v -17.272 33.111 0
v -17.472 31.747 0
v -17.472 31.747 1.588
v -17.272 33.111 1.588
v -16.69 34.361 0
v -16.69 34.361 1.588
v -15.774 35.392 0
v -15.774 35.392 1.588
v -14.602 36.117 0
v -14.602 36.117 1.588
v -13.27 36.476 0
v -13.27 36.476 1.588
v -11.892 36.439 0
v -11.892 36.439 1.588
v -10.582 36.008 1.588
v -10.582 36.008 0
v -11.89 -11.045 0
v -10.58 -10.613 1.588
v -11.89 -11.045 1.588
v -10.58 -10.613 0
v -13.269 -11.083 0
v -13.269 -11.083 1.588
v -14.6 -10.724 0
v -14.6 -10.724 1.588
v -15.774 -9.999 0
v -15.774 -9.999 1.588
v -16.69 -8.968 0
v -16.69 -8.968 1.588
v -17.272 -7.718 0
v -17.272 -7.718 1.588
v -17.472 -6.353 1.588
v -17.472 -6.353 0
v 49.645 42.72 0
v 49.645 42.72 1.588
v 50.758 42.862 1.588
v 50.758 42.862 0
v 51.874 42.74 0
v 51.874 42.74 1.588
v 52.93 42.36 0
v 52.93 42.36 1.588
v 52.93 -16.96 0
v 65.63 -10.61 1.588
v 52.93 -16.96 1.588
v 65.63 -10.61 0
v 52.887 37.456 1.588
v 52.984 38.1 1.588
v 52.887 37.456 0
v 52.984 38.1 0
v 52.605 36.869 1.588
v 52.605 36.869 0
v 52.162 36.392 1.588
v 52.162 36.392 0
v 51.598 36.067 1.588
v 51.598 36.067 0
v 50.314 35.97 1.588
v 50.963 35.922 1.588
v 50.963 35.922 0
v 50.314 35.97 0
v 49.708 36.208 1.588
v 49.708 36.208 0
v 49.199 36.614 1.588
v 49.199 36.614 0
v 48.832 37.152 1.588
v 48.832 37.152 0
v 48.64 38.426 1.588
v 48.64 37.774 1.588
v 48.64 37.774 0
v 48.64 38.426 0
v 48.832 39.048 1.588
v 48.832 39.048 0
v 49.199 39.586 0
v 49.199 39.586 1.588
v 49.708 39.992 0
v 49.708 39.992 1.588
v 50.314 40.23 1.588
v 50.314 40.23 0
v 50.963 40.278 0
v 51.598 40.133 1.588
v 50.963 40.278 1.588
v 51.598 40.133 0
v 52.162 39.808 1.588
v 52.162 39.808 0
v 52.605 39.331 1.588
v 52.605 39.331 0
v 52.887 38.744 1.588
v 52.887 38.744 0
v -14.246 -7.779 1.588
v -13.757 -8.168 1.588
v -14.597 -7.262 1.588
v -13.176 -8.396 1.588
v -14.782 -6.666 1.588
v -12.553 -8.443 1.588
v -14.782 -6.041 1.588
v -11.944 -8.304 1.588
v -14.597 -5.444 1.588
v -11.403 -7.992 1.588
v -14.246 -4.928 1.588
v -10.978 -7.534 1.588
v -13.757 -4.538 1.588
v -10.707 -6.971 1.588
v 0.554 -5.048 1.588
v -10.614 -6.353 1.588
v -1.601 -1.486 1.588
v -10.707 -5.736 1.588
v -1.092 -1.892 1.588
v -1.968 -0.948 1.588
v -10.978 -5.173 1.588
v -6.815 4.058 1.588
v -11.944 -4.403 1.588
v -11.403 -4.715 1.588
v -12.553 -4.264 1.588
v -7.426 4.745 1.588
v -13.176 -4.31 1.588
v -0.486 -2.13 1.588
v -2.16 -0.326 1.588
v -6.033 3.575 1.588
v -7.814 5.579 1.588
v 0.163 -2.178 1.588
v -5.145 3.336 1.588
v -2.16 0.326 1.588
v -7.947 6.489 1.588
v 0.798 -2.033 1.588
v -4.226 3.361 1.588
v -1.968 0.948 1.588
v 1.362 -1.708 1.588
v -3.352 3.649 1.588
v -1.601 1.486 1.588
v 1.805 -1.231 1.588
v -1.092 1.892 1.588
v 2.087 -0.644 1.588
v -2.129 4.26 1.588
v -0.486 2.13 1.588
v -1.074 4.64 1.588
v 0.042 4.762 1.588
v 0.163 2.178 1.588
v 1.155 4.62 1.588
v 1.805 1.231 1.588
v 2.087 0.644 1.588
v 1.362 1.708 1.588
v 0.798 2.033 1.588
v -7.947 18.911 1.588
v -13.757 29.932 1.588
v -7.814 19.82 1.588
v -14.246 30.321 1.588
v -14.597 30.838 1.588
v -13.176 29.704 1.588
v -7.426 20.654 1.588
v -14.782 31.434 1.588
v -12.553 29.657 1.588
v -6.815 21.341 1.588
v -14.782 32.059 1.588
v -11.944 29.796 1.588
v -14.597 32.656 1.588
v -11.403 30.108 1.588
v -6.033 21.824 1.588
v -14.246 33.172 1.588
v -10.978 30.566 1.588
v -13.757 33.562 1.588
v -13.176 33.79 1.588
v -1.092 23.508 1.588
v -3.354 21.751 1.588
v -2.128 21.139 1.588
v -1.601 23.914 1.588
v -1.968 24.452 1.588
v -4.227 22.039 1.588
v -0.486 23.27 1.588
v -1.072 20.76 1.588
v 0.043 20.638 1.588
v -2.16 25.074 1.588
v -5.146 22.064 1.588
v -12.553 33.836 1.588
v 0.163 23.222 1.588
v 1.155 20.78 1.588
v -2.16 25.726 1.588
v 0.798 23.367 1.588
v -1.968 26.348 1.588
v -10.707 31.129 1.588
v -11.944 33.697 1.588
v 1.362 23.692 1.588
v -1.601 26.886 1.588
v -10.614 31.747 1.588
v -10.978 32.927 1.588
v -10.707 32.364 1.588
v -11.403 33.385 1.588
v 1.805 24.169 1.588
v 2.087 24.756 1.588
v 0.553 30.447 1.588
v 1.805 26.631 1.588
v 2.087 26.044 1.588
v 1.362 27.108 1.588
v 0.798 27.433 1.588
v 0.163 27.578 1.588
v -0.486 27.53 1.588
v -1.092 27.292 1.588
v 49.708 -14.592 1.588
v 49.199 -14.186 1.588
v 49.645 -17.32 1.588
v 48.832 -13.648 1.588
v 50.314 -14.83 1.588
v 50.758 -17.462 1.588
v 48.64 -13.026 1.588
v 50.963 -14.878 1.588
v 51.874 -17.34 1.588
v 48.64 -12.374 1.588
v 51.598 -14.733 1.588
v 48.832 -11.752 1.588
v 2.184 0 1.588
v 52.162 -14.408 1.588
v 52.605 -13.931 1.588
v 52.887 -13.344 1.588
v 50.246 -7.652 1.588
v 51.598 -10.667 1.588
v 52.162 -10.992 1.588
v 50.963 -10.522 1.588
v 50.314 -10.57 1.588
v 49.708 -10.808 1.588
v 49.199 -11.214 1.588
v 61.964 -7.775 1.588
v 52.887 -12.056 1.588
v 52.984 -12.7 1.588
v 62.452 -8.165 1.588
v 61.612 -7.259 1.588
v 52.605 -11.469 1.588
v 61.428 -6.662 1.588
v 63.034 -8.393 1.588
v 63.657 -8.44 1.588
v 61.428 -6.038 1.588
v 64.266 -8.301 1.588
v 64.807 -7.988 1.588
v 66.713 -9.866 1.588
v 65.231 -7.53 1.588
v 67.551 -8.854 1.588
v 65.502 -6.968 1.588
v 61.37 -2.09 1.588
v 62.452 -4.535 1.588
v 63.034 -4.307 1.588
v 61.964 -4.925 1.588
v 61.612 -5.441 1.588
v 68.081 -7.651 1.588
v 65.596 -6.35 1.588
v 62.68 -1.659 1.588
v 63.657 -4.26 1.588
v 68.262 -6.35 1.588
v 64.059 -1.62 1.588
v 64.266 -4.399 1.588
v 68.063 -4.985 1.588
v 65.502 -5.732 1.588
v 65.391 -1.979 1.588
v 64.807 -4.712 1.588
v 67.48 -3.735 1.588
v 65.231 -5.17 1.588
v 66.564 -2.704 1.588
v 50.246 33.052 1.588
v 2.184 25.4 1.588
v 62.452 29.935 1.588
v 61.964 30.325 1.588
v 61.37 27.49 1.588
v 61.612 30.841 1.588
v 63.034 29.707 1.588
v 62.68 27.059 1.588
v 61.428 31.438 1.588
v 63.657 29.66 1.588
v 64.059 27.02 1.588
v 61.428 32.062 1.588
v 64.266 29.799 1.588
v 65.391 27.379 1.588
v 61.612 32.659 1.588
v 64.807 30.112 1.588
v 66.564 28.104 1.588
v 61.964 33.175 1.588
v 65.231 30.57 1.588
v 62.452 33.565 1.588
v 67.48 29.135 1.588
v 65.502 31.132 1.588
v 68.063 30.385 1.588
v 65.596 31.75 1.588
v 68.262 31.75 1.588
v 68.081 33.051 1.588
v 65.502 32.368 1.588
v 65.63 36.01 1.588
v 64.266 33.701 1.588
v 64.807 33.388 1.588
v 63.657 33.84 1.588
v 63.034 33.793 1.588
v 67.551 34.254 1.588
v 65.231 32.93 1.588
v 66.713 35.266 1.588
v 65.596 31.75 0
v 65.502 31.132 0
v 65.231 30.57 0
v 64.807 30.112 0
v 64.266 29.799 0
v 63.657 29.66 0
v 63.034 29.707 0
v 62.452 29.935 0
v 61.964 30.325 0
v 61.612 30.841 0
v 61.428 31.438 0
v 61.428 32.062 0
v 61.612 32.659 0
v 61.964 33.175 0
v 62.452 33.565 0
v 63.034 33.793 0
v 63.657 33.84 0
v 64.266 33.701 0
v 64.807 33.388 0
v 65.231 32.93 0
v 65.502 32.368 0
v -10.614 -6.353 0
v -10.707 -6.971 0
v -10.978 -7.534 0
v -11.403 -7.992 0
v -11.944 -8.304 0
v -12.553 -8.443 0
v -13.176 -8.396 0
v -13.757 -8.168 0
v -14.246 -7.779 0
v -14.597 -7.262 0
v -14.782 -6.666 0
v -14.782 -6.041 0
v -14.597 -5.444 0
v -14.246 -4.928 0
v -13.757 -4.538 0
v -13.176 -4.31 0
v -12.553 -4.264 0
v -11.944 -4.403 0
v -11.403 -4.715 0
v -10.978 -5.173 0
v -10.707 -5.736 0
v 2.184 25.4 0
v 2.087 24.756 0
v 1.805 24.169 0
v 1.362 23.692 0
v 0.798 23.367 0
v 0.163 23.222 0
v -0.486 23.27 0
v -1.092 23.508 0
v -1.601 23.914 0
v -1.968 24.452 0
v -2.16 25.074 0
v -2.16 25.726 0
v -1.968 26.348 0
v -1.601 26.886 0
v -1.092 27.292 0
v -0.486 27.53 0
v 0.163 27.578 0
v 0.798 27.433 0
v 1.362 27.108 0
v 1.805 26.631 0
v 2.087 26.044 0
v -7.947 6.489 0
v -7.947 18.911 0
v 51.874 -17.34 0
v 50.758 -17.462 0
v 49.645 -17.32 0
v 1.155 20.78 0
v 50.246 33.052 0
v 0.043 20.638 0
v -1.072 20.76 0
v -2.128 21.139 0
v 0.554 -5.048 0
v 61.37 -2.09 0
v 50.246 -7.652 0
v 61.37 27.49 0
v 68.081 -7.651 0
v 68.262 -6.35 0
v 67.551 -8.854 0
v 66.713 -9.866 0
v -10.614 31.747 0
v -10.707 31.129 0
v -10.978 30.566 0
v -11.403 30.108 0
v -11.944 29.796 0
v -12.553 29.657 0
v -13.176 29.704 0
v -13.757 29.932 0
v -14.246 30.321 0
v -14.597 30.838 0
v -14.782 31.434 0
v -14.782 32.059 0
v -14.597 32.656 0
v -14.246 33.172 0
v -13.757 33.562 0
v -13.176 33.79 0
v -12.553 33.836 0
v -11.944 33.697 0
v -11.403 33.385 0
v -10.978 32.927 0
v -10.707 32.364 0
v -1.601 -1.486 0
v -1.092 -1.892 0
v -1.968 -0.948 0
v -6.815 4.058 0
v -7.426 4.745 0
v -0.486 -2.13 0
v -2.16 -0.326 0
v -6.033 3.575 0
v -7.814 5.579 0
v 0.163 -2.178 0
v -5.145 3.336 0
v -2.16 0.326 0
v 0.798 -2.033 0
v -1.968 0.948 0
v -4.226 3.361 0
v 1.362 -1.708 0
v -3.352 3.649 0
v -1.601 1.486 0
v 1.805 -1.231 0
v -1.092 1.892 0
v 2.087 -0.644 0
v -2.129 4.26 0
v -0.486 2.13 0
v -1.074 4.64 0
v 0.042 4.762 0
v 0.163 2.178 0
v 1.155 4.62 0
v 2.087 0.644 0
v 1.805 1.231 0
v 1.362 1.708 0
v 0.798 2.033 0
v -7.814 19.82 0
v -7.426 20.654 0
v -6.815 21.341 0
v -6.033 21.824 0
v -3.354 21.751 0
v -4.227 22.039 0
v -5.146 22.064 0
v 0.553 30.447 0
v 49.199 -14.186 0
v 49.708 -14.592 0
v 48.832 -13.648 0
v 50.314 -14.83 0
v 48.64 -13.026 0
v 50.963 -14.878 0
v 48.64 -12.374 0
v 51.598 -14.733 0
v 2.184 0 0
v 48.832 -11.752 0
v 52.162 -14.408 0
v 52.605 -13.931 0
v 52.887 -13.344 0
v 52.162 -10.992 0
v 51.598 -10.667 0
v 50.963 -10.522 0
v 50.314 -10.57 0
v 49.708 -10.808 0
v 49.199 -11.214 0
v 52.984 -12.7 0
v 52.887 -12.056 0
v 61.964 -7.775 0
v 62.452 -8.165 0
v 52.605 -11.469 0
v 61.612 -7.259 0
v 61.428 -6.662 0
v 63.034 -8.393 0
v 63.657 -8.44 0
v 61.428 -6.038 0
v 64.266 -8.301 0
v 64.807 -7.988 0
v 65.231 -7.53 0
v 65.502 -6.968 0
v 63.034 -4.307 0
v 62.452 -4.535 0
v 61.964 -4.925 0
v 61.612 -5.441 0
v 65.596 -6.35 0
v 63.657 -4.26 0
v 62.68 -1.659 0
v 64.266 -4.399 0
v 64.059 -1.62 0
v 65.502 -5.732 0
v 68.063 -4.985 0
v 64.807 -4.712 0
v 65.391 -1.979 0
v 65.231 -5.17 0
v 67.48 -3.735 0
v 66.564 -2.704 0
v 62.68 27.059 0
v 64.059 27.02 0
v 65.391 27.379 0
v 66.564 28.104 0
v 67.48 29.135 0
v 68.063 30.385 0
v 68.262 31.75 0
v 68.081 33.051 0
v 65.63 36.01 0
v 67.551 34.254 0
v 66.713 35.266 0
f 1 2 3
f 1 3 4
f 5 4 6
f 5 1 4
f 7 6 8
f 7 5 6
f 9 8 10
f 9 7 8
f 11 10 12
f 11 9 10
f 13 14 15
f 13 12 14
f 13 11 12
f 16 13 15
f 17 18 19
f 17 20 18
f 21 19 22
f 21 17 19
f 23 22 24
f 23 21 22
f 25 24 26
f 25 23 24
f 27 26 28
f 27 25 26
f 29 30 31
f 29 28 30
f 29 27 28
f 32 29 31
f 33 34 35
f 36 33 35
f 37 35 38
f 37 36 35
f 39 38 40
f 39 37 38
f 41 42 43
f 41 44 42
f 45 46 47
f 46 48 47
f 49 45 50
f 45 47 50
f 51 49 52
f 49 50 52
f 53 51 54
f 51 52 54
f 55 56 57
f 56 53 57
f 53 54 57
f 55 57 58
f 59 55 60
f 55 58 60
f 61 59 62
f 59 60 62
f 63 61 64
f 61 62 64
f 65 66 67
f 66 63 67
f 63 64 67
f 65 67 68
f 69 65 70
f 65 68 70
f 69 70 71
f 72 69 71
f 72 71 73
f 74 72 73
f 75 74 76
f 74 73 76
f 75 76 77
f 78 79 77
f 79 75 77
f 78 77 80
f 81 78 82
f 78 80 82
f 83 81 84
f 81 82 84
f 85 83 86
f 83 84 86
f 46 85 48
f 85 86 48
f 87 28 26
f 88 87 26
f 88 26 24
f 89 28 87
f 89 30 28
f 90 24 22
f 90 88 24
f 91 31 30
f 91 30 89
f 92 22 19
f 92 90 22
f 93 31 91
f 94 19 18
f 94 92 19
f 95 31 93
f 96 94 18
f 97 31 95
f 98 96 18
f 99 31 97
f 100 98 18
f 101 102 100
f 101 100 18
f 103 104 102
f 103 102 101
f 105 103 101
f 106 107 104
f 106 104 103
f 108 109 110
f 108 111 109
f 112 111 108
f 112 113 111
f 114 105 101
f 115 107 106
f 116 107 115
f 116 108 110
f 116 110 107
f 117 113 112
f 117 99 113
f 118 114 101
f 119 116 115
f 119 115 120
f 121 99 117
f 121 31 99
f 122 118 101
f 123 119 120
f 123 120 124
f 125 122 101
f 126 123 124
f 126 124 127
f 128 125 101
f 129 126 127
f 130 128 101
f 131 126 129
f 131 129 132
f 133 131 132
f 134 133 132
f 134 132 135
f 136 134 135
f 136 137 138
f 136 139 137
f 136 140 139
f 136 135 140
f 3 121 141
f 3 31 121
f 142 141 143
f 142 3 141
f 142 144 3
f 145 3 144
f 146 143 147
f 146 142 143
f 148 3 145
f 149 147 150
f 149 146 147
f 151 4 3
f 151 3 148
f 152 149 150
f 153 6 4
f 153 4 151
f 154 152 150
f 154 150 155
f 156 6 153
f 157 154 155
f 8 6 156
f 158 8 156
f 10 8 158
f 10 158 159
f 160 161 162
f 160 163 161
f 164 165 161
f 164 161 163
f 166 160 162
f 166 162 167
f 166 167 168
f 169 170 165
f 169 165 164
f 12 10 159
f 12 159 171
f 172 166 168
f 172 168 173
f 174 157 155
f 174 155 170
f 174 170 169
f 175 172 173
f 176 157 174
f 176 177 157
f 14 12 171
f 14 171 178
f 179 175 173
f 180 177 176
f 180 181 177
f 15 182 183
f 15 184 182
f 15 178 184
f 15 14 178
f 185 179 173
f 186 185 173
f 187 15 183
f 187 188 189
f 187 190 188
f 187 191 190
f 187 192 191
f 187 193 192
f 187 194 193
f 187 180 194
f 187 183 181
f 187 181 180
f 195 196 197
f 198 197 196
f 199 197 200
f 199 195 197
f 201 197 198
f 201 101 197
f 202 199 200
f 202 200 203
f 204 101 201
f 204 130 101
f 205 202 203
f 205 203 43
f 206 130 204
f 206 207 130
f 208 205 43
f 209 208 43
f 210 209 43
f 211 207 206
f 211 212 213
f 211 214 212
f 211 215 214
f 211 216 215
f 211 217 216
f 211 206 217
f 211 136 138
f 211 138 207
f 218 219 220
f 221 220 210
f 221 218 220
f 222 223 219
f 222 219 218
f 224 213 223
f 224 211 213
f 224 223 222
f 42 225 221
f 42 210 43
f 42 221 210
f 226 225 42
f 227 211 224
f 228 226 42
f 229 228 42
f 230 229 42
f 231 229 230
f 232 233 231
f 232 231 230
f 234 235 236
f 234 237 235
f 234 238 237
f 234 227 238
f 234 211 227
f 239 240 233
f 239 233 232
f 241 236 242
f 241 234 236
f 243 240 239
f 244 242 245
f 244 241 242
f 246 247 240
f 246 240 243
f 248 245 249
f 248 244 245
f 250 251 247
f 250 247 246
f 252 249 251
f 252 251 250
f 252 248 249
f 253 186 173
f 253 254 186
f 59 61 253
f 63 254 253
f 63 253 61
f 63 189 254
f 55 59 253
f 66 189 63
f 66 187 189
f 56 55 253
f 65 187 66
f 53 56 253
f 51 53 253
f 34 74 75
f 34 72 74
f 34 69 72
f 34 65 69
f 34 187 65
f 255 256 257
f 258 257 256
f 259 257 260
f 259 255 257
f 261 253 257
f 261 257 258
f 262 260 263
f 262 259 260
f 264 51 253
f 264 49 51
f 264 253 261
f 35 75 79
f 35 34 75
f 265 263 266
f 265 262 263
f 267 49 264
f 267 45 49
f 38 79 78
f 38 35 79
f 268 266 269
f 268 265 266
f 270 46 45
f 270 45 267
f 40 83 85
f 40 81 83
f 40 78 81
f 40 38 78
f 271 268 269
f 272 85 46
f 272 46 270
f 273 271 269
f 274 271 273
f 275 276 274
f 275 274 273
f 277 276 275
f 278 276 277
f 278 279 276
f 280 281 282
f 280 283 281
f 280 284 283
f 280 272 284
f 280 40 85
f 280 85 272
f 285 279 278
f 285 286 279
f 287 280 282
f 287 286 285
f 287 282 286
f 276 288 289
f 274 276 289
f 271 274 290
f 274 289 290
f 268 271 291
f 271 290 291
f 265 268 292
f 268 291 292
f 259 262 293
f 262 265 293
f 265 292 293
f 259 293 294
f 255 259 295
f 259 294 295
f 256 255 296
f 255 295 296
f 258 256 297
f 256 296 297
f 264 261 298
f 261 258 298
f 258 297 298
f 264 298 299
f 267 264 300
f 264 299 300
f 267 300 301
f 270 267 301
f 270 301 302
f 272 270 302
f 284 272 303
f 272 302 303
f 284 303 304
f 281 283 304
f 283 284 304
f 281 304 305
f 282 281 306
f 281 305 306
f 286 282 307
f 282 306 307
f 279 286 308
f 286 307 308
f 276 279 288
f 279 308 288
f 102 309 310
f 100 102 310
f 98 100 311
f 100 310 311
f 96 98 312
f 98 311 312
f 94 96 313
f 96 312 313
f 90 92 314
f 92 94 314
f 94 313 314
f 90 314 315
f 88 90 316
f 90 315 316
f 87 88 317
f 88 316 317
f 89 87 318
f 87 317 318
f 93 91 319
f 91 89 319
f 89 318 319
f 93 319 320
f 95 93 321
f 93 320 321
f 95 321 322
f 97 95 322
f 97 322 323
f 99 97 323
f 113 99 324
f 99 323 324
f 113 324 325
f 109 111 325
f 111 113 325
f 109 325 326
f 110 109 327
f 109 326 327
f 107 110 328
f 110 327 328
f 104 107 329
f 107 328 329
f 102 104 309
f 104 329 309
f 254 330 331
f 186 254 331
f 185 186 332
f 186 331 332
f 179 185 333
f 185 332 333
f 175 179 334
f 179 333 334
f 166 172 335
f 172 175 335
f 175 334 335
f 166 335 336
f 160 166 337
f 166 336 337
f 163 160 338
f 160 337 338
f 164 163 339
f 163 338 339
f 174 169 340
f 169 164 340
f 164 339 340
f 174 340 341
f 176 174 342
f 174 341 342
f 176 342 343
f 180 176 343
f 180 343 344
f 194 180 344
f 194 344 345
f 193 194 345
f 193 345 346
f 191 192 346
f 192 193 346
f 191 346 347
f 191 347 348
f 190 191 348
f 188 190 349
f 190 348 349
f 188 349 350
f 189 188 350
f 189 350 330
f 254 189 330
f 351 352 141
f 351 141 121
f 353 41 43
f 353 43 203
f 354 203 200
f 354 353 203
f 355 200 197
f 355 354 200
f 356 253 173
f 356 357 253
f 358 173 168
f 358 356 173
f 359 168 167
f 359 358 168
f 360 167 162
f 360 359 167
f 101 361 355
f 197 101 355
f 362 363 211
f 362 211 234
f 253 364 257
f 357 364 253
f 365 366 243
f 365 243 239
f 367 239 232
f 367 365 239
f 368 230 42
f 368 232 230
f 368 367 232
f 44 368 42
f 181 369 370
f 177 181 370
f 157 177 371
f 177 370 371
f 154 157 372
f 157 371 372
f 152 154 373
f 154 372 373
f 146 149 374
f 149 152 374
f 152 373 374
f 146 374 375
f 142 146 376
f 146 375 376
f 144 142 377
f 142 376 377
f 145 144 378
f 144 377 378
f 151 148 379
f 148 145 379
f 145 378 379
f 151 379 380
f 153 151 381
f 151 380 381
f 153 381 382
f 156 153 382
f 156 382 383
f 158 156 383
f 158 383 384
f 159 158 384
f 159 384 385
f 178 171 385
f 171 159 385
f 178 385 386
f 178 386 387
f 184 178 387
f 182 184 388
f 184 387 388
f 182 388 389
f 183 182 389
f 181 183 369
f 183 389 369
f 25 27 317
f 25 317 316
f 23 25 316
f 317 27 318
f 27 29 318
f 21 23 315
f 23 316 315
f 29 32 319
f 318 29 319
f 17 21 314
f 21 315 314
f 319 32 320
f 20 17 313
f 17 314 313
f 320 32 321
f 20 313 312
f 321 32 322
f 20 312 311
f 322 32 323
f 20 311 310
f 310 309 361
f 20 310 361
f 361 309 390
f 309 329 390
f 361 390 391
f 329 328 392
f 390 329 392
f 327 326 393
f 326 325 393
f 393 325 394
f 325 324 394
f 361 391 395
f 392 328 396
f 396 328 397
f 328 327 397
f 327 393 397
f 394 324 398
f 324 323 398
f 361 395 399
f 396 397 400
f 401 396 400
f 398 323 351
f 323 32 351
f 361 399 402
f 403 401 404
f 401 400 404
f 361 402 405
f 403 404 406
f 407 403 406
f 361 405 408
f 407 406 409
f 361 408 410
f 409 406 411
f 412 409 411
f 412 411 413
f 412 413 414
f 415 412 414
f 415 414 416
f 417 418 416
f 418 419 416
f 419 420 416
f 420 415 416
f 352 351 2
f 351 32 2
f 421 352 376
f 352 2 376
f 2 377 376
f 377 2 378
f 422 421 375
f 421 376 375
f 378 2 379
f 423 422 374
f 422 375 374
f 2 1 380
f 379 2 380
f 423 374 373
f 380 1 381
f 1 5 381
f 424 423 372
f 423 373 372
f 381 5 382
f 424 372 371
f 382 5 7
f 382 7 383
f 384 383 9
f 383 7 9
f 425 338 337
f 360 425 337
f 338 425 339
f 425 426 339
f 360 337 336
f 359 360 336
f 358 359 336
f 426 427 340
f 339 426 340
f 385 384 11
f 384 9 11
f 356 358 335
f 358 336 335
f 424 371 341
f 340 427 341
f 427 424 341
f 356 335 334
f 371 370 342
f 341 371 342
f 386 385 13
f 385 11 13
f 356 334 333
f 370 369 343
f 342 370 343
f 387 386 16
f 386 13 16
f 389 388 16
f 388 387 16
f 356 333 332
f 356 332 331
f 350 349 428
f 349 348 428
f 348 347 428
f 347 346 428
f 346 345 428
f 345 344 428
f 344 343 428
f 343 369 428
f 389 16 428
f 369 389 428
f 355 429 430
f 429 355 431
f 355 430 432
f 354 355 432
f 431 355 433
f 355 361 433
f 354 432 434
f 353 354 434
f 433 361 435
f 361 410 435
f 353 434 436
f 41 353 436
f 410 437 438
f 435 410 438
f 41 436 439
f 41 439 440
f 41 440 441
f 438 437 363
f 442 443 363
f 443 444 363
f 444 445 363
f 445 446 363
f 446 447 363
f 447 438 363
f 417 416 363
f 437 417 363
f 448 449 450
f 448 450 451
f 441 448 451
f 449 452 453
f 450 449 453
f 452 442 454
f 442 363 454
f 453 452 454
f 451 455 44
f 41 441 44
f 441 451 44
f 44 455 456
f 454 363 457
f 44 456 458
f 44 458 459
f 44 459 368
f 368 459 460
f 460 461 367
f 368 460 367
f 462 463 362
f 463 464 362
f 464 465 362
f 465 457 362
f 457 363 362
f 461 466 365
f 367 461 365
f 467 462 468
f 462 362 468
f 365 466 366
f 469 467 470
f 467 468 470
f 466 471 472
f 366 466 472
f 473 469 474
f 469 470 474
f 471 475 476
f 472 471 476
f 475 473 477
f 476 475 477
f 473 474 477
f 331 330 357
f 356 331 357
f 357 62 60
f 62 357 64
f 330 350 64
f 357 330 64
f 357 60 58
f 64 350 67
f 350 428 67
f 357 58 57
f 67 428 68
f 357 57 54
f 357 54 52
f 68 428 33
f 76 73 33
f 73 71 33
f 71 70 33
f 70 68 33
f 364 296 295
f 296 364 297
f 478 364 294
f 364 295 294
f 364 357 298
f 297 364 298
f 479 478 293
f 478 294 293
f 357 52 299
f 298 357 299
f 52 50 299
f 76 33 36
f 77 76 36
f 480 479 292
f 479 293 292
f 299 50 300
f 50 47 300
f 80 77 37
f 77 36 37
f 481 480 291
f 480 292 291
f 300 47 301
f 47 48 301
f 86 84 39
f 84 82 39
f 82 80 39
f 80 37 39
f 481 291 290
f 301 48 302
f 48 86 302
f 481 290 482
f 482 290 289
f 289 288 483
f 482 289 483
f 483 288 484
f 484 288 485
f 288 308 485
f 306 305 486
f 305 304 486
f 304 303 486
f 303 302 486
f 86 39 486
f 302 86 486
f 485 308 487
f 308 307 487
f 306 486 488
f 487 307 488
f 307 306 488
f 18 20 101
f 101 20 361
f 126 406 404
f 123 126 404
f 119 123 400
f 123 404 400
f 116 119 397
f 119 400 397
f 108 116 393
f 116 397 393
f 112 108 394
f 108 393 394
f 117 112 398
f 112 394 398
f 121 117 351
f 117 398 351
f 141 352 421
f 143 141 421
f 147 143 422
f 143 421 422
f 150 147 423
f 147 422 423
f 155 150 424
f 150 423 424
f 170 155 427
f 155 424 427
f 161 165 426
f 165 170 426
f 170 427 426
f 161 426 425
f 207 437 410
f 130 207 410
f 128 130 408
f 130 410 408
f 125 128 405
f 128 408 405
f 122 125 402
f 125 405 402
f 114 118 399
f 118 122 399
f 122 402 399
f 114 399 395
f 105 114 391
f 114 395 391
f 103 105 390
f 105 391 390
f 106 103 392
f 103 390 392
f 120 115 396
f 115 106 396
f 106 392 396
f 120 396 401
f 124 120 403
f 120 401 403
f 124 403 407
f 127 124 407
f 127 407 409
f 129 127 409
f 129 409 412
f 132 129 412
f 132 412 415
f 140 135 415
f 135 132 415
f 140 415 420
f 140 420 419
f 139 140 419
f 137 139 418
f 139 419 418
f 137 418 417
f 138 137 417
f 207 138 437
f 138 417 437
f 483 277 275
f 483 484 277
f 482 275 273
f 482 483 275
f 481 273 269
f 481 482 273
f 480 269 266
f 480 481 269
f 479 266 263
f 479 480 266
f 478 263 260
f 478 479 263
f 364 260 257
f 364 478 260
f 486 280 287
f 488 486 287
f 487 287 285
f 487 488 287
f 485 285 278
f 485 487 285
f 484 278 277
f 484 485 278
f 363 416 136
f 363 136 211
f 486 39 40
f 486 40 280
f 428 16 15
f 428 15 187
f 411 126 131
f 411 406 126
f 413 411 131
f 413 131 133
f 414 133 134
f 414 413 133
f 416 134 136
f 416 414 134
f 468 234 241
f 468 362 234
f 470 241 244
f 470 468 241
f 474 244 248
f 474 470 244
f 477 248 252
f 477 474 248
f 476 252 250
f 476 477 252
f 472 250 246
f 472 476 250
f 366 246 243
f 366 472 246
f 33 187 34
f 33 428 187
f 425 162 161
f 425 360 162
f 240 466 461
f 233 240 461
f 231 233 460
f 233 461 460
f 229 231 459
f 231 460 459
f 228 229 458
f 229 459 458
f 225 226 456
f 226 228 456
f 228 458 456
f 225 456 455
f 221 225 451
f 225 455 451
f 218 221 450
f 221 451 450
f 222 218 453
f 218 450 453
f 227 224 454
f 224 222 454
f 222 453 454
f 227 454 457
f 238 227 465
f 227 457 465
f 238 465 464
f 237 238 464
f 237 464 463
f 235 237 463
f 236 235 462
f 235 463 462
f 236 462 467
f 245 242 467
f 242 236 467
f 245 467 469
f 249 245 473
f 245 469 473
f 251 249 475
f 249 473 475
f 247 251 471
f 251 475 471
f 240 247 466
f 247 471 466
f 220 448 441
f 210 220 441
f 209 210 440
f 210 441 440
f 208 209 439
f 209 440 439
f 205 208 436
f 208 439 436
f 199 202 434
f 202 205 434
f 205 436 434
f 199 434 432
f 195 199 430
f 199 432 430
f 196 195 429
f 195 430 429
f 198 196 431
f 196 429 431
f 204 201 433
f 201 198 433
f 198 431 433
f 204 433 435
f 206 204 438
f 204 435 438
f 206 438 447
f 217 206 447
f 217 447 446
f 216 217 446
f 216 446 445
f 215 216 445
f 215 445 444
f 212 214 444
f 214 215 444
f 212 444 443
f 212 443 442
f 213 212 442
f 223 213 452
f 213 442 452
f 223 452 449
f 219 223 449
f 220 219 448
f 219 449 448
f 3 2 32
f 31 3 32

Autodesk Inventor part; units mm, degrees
ref_plane "YZ Plane" through (0, 0, 0) normal (1, 0, 0) x (0, 1, 0)
ref_plane "XZ Plane" through (0, 0, 0) normal (0, 1, 0) x (-1, 0, 0)
ref_plane "XY Plane" through (0, 0, 0) normal (0, 0, 1) x (1, 0, 0)
sketch "main" plane through (0, 0, 0) normal (0, 0, 1) x (1, 0, 0)
  circle A0 centre (37.6731, -16.4179) radius 2.0955
  circle A1 centre (37.6731, 21.6821) radius 2.0955
  circle A2 centre (24.9731, 28.0321) radius 2.1844
  circle A3 centre (24.9731, -22.7679) radius 2.1844
  circle A4 centre (-38.5364, -16.421) radius 2.0955
  circle A5 centre (-38.5364, 21.679) radius 2.0955
  circle A6 centre (-25.8269, -10.0679) radius 2.1844
  circle A7 centre (-25.8269, 15.3321) radius 2.1844
  arc A8 (-27.9546, 11.0714) -> (-24.6718, 10.7118) centre (-25.8269, 15.3321) ccw
  arc A9 (27.103, 32.2919) -> (23.818, 32.6525) centre (24.9731, 28.0321) ccw
  arc A10 (42.4356, 21.6821) -> (39.803, 25.9419) centre (37.6731, 21.6821) ccw
  arc A11 (39.803, -20.6776) -> (42.4356, -16.4179) centre (37.6731, -16.4179) ccw
  arc A12 (23.818, -27.3882) -> (27.103, -27.0276) centre (24.9731, -22.7679) ccw
  arc A13 (-24.6718, -5.4475) -> (-27.9563, -5.8079) centre (-25.8269, -10.0679) ccw
  arc A14 (-43.2989, -16.421) -> (-36.4069, -20.6809) centre (-38.5364, -16.421) ccw
  arc A15 (-36.4086, 25.9397) -> (-43.2989, 21.679) centre (-38.5364, 21.679) ccw
  line L0 (-43.2989, 21.679) -> (-43.2989, -16.421)
  line L1 (-36.4069, -20.6809) -> (-25.273, -15.1154)
  line L2 (-36.4086, 25.9397) -> (-25.2741, 20.3794)
  line L3 (-25.2741, 20.3794) -> (23.818, 32.6525)
  line L4 (27.103, 32.2919) -> (39.803, 25.9419)
  line L5 (39.803, -20.6776) -> (27.103, -27.0276)
  line L6 (-25.273, -15.1154) -> (23.818, -27.3882)
  line L7 (-27.9546, 11.0714) -> (-29.1804, 11.6835)
  line L8 (-33.7739, 8.843) -> (-33.7739, -3.5793)
  line L9 (-29.1792, -6.4192) -> (-27.9563, -5.8079)
  line L10 (-24.6718, -5.4475) -> (24.419, -17.7203)
  line L11 (24.419, -17.7203) -> (35.5433, -12.1581)
  line L12 (35.5433, 17.4224) -> (24.419, 22.9846)
  line L13 (24.419, 22.9846) -> (-24.6718, 10.7118)
  arc A16 (-33.7739, -3.5793) -> (-29.1792, -6.4192) centre (-30.5989, -3.5793) ccw
  arc A17 (-29.1804, 11.6835) -> (-33.7739, 8.843) centre (-30.5989, 8.843) ccw
  arc A18 (35.5433, 17.4224) -> (39.803, 25.9419) centre (37.6731, 21.6821) ccw
  arc A19 (39.803, -20.6776) -> (35.5433, -12.1581) centre (37.6731, -16.4179) ccw
  point P0 (-0.4291, 2.6313)
  point P1 (-25.8269, -22.7679)
  dimension "d9" = 9.525
  dimension "d10" = 9.525
  dimension "d11" = 9.525
  dimension "d12" = 9.525
  dimension "d13" = 9.525
  dimension "d14" = 9.525
  dimension "d15" = 9.525
  dimension "d16" = 9.525
  dimension "d17" = 9.525
  dimension "d20" = 12.7
  dimension "d21" = 25.4
  dimension "d22" = 3.175
sketch "Sketch1" plane through (0, 0, 0) normal (0, 0, 1) x (1, 0, 0)
  circle A0 centre (63.5, -6.35) radius 2.0955
  circle A1 centre (63.5, 31.75) radius 2.0955
  circle A2 centre (50.8, 38.1) radius 2.1844
  circle A3 centre (50.8, -12.7) radius 2.1844
  circle A4 centre (-12.7095, -6.3532) radius 2.0955
  circle A5 centre (-12.7095, 31.7468) radius 2.0955
  circle A6 centre (0, 0) radius 2.1844
  circle A7 centre (0, 25.4) radius 2.1844
  arc A8 (-2.1277, 21.1392) -> (1.1551, 20.7797) centre (0, 25.4) ccw
  arc A9 (52.9299, 42.3597) -> (49.6449, 42.7203) centre (50.8, 38.1) ccw
  arc A10 (68.2625, 31.75) -> (65.6299, 36.0097) centre (63.5, 31.75) ccw
  arc A11 (65.6299, -10.6097) -> (68.2625, -6.35) centre (63.5, -6.35) ccw
  arc A12 (49.6449, -17.3203) -> (52.9299, -16.9597) centre (50.8, -12.7) ccw
  arc A13 (1.1551, 4.6203) -> (-2.1294, 4.2599) centre (0, 0) ccw
  arc A14 (-17.472, -6.3532) -> (-10.58, -10.6131) centre (-12.7095, -6.3532) ccw
  arc A15 (-10.5818, 36.0076) -> (-17.472, 31.7468) centre (-12.7095, 31.7468) ccw
  line L0 (-17.472, 31.7468) -> (-17.472, -6.3532)
  line L1 (-10.58, -10.6131) -> (0.5538, -5.0475)
  line L2 (-10.5818, 36.0076) -> (0.5528, 30.4473)
  line L3 (0.5528, 30.4473) -> (49.6449, 42.7203)
  line L4 (52.9299, 42.3597) -> (65.6299, 36.0097)
  line L5 (65.6299, -10.6097) -> (52.9299, -16.9597)
  line L6 (0.5538, -5.0475) -> (49.6449, -17.3203)
  line L7 (-2.1277, 21.1392) -> (-3.3535, 21.7513)
  line L8 (-7.947, 18.9108) -> (-7.947, 6.4886)
  line L9 (-3.3524, 3.6486) -> (-2.1294, 4.2599)
  line L10 (1.1551, 4.6203) -> (50.2459, -7.6524)
  line L11 (50.2459, -7.6524) -> (61.3701, -2.0903)
  line L12 (61.3701, 27.4903) -> (50.2459, 33.0524)
  line L13 (50.2459, 33.0524) -> (1.1551, 20.7797)
  arc A16 (-7.947, 6.4886) -> (-3.3524, 3.6486) centre (-4.772, 6.4886) ccw
  arc A17 (-3.3535, 21.7513) -> (-7.947, 18.9108) centre (-4.772, 18.9108) ccw
  arc A18 (61.3701, 27.4903) -> (65.6299, 36.0097) centre (63.5, 31.75) ccw
  arc A19 (65.6299, -10.6097) -> (61.3701, -2.0903) centre (63.5, -6.35) ccw
  point P0 (68.2625, -6.35)
  point P1 (68.2625, 31.75)
extrude "Extrusion1" add sketch "Sketch1" along normal blind 1.5875
properties part number "Brain Mount" material "Acetal Resin, White"
